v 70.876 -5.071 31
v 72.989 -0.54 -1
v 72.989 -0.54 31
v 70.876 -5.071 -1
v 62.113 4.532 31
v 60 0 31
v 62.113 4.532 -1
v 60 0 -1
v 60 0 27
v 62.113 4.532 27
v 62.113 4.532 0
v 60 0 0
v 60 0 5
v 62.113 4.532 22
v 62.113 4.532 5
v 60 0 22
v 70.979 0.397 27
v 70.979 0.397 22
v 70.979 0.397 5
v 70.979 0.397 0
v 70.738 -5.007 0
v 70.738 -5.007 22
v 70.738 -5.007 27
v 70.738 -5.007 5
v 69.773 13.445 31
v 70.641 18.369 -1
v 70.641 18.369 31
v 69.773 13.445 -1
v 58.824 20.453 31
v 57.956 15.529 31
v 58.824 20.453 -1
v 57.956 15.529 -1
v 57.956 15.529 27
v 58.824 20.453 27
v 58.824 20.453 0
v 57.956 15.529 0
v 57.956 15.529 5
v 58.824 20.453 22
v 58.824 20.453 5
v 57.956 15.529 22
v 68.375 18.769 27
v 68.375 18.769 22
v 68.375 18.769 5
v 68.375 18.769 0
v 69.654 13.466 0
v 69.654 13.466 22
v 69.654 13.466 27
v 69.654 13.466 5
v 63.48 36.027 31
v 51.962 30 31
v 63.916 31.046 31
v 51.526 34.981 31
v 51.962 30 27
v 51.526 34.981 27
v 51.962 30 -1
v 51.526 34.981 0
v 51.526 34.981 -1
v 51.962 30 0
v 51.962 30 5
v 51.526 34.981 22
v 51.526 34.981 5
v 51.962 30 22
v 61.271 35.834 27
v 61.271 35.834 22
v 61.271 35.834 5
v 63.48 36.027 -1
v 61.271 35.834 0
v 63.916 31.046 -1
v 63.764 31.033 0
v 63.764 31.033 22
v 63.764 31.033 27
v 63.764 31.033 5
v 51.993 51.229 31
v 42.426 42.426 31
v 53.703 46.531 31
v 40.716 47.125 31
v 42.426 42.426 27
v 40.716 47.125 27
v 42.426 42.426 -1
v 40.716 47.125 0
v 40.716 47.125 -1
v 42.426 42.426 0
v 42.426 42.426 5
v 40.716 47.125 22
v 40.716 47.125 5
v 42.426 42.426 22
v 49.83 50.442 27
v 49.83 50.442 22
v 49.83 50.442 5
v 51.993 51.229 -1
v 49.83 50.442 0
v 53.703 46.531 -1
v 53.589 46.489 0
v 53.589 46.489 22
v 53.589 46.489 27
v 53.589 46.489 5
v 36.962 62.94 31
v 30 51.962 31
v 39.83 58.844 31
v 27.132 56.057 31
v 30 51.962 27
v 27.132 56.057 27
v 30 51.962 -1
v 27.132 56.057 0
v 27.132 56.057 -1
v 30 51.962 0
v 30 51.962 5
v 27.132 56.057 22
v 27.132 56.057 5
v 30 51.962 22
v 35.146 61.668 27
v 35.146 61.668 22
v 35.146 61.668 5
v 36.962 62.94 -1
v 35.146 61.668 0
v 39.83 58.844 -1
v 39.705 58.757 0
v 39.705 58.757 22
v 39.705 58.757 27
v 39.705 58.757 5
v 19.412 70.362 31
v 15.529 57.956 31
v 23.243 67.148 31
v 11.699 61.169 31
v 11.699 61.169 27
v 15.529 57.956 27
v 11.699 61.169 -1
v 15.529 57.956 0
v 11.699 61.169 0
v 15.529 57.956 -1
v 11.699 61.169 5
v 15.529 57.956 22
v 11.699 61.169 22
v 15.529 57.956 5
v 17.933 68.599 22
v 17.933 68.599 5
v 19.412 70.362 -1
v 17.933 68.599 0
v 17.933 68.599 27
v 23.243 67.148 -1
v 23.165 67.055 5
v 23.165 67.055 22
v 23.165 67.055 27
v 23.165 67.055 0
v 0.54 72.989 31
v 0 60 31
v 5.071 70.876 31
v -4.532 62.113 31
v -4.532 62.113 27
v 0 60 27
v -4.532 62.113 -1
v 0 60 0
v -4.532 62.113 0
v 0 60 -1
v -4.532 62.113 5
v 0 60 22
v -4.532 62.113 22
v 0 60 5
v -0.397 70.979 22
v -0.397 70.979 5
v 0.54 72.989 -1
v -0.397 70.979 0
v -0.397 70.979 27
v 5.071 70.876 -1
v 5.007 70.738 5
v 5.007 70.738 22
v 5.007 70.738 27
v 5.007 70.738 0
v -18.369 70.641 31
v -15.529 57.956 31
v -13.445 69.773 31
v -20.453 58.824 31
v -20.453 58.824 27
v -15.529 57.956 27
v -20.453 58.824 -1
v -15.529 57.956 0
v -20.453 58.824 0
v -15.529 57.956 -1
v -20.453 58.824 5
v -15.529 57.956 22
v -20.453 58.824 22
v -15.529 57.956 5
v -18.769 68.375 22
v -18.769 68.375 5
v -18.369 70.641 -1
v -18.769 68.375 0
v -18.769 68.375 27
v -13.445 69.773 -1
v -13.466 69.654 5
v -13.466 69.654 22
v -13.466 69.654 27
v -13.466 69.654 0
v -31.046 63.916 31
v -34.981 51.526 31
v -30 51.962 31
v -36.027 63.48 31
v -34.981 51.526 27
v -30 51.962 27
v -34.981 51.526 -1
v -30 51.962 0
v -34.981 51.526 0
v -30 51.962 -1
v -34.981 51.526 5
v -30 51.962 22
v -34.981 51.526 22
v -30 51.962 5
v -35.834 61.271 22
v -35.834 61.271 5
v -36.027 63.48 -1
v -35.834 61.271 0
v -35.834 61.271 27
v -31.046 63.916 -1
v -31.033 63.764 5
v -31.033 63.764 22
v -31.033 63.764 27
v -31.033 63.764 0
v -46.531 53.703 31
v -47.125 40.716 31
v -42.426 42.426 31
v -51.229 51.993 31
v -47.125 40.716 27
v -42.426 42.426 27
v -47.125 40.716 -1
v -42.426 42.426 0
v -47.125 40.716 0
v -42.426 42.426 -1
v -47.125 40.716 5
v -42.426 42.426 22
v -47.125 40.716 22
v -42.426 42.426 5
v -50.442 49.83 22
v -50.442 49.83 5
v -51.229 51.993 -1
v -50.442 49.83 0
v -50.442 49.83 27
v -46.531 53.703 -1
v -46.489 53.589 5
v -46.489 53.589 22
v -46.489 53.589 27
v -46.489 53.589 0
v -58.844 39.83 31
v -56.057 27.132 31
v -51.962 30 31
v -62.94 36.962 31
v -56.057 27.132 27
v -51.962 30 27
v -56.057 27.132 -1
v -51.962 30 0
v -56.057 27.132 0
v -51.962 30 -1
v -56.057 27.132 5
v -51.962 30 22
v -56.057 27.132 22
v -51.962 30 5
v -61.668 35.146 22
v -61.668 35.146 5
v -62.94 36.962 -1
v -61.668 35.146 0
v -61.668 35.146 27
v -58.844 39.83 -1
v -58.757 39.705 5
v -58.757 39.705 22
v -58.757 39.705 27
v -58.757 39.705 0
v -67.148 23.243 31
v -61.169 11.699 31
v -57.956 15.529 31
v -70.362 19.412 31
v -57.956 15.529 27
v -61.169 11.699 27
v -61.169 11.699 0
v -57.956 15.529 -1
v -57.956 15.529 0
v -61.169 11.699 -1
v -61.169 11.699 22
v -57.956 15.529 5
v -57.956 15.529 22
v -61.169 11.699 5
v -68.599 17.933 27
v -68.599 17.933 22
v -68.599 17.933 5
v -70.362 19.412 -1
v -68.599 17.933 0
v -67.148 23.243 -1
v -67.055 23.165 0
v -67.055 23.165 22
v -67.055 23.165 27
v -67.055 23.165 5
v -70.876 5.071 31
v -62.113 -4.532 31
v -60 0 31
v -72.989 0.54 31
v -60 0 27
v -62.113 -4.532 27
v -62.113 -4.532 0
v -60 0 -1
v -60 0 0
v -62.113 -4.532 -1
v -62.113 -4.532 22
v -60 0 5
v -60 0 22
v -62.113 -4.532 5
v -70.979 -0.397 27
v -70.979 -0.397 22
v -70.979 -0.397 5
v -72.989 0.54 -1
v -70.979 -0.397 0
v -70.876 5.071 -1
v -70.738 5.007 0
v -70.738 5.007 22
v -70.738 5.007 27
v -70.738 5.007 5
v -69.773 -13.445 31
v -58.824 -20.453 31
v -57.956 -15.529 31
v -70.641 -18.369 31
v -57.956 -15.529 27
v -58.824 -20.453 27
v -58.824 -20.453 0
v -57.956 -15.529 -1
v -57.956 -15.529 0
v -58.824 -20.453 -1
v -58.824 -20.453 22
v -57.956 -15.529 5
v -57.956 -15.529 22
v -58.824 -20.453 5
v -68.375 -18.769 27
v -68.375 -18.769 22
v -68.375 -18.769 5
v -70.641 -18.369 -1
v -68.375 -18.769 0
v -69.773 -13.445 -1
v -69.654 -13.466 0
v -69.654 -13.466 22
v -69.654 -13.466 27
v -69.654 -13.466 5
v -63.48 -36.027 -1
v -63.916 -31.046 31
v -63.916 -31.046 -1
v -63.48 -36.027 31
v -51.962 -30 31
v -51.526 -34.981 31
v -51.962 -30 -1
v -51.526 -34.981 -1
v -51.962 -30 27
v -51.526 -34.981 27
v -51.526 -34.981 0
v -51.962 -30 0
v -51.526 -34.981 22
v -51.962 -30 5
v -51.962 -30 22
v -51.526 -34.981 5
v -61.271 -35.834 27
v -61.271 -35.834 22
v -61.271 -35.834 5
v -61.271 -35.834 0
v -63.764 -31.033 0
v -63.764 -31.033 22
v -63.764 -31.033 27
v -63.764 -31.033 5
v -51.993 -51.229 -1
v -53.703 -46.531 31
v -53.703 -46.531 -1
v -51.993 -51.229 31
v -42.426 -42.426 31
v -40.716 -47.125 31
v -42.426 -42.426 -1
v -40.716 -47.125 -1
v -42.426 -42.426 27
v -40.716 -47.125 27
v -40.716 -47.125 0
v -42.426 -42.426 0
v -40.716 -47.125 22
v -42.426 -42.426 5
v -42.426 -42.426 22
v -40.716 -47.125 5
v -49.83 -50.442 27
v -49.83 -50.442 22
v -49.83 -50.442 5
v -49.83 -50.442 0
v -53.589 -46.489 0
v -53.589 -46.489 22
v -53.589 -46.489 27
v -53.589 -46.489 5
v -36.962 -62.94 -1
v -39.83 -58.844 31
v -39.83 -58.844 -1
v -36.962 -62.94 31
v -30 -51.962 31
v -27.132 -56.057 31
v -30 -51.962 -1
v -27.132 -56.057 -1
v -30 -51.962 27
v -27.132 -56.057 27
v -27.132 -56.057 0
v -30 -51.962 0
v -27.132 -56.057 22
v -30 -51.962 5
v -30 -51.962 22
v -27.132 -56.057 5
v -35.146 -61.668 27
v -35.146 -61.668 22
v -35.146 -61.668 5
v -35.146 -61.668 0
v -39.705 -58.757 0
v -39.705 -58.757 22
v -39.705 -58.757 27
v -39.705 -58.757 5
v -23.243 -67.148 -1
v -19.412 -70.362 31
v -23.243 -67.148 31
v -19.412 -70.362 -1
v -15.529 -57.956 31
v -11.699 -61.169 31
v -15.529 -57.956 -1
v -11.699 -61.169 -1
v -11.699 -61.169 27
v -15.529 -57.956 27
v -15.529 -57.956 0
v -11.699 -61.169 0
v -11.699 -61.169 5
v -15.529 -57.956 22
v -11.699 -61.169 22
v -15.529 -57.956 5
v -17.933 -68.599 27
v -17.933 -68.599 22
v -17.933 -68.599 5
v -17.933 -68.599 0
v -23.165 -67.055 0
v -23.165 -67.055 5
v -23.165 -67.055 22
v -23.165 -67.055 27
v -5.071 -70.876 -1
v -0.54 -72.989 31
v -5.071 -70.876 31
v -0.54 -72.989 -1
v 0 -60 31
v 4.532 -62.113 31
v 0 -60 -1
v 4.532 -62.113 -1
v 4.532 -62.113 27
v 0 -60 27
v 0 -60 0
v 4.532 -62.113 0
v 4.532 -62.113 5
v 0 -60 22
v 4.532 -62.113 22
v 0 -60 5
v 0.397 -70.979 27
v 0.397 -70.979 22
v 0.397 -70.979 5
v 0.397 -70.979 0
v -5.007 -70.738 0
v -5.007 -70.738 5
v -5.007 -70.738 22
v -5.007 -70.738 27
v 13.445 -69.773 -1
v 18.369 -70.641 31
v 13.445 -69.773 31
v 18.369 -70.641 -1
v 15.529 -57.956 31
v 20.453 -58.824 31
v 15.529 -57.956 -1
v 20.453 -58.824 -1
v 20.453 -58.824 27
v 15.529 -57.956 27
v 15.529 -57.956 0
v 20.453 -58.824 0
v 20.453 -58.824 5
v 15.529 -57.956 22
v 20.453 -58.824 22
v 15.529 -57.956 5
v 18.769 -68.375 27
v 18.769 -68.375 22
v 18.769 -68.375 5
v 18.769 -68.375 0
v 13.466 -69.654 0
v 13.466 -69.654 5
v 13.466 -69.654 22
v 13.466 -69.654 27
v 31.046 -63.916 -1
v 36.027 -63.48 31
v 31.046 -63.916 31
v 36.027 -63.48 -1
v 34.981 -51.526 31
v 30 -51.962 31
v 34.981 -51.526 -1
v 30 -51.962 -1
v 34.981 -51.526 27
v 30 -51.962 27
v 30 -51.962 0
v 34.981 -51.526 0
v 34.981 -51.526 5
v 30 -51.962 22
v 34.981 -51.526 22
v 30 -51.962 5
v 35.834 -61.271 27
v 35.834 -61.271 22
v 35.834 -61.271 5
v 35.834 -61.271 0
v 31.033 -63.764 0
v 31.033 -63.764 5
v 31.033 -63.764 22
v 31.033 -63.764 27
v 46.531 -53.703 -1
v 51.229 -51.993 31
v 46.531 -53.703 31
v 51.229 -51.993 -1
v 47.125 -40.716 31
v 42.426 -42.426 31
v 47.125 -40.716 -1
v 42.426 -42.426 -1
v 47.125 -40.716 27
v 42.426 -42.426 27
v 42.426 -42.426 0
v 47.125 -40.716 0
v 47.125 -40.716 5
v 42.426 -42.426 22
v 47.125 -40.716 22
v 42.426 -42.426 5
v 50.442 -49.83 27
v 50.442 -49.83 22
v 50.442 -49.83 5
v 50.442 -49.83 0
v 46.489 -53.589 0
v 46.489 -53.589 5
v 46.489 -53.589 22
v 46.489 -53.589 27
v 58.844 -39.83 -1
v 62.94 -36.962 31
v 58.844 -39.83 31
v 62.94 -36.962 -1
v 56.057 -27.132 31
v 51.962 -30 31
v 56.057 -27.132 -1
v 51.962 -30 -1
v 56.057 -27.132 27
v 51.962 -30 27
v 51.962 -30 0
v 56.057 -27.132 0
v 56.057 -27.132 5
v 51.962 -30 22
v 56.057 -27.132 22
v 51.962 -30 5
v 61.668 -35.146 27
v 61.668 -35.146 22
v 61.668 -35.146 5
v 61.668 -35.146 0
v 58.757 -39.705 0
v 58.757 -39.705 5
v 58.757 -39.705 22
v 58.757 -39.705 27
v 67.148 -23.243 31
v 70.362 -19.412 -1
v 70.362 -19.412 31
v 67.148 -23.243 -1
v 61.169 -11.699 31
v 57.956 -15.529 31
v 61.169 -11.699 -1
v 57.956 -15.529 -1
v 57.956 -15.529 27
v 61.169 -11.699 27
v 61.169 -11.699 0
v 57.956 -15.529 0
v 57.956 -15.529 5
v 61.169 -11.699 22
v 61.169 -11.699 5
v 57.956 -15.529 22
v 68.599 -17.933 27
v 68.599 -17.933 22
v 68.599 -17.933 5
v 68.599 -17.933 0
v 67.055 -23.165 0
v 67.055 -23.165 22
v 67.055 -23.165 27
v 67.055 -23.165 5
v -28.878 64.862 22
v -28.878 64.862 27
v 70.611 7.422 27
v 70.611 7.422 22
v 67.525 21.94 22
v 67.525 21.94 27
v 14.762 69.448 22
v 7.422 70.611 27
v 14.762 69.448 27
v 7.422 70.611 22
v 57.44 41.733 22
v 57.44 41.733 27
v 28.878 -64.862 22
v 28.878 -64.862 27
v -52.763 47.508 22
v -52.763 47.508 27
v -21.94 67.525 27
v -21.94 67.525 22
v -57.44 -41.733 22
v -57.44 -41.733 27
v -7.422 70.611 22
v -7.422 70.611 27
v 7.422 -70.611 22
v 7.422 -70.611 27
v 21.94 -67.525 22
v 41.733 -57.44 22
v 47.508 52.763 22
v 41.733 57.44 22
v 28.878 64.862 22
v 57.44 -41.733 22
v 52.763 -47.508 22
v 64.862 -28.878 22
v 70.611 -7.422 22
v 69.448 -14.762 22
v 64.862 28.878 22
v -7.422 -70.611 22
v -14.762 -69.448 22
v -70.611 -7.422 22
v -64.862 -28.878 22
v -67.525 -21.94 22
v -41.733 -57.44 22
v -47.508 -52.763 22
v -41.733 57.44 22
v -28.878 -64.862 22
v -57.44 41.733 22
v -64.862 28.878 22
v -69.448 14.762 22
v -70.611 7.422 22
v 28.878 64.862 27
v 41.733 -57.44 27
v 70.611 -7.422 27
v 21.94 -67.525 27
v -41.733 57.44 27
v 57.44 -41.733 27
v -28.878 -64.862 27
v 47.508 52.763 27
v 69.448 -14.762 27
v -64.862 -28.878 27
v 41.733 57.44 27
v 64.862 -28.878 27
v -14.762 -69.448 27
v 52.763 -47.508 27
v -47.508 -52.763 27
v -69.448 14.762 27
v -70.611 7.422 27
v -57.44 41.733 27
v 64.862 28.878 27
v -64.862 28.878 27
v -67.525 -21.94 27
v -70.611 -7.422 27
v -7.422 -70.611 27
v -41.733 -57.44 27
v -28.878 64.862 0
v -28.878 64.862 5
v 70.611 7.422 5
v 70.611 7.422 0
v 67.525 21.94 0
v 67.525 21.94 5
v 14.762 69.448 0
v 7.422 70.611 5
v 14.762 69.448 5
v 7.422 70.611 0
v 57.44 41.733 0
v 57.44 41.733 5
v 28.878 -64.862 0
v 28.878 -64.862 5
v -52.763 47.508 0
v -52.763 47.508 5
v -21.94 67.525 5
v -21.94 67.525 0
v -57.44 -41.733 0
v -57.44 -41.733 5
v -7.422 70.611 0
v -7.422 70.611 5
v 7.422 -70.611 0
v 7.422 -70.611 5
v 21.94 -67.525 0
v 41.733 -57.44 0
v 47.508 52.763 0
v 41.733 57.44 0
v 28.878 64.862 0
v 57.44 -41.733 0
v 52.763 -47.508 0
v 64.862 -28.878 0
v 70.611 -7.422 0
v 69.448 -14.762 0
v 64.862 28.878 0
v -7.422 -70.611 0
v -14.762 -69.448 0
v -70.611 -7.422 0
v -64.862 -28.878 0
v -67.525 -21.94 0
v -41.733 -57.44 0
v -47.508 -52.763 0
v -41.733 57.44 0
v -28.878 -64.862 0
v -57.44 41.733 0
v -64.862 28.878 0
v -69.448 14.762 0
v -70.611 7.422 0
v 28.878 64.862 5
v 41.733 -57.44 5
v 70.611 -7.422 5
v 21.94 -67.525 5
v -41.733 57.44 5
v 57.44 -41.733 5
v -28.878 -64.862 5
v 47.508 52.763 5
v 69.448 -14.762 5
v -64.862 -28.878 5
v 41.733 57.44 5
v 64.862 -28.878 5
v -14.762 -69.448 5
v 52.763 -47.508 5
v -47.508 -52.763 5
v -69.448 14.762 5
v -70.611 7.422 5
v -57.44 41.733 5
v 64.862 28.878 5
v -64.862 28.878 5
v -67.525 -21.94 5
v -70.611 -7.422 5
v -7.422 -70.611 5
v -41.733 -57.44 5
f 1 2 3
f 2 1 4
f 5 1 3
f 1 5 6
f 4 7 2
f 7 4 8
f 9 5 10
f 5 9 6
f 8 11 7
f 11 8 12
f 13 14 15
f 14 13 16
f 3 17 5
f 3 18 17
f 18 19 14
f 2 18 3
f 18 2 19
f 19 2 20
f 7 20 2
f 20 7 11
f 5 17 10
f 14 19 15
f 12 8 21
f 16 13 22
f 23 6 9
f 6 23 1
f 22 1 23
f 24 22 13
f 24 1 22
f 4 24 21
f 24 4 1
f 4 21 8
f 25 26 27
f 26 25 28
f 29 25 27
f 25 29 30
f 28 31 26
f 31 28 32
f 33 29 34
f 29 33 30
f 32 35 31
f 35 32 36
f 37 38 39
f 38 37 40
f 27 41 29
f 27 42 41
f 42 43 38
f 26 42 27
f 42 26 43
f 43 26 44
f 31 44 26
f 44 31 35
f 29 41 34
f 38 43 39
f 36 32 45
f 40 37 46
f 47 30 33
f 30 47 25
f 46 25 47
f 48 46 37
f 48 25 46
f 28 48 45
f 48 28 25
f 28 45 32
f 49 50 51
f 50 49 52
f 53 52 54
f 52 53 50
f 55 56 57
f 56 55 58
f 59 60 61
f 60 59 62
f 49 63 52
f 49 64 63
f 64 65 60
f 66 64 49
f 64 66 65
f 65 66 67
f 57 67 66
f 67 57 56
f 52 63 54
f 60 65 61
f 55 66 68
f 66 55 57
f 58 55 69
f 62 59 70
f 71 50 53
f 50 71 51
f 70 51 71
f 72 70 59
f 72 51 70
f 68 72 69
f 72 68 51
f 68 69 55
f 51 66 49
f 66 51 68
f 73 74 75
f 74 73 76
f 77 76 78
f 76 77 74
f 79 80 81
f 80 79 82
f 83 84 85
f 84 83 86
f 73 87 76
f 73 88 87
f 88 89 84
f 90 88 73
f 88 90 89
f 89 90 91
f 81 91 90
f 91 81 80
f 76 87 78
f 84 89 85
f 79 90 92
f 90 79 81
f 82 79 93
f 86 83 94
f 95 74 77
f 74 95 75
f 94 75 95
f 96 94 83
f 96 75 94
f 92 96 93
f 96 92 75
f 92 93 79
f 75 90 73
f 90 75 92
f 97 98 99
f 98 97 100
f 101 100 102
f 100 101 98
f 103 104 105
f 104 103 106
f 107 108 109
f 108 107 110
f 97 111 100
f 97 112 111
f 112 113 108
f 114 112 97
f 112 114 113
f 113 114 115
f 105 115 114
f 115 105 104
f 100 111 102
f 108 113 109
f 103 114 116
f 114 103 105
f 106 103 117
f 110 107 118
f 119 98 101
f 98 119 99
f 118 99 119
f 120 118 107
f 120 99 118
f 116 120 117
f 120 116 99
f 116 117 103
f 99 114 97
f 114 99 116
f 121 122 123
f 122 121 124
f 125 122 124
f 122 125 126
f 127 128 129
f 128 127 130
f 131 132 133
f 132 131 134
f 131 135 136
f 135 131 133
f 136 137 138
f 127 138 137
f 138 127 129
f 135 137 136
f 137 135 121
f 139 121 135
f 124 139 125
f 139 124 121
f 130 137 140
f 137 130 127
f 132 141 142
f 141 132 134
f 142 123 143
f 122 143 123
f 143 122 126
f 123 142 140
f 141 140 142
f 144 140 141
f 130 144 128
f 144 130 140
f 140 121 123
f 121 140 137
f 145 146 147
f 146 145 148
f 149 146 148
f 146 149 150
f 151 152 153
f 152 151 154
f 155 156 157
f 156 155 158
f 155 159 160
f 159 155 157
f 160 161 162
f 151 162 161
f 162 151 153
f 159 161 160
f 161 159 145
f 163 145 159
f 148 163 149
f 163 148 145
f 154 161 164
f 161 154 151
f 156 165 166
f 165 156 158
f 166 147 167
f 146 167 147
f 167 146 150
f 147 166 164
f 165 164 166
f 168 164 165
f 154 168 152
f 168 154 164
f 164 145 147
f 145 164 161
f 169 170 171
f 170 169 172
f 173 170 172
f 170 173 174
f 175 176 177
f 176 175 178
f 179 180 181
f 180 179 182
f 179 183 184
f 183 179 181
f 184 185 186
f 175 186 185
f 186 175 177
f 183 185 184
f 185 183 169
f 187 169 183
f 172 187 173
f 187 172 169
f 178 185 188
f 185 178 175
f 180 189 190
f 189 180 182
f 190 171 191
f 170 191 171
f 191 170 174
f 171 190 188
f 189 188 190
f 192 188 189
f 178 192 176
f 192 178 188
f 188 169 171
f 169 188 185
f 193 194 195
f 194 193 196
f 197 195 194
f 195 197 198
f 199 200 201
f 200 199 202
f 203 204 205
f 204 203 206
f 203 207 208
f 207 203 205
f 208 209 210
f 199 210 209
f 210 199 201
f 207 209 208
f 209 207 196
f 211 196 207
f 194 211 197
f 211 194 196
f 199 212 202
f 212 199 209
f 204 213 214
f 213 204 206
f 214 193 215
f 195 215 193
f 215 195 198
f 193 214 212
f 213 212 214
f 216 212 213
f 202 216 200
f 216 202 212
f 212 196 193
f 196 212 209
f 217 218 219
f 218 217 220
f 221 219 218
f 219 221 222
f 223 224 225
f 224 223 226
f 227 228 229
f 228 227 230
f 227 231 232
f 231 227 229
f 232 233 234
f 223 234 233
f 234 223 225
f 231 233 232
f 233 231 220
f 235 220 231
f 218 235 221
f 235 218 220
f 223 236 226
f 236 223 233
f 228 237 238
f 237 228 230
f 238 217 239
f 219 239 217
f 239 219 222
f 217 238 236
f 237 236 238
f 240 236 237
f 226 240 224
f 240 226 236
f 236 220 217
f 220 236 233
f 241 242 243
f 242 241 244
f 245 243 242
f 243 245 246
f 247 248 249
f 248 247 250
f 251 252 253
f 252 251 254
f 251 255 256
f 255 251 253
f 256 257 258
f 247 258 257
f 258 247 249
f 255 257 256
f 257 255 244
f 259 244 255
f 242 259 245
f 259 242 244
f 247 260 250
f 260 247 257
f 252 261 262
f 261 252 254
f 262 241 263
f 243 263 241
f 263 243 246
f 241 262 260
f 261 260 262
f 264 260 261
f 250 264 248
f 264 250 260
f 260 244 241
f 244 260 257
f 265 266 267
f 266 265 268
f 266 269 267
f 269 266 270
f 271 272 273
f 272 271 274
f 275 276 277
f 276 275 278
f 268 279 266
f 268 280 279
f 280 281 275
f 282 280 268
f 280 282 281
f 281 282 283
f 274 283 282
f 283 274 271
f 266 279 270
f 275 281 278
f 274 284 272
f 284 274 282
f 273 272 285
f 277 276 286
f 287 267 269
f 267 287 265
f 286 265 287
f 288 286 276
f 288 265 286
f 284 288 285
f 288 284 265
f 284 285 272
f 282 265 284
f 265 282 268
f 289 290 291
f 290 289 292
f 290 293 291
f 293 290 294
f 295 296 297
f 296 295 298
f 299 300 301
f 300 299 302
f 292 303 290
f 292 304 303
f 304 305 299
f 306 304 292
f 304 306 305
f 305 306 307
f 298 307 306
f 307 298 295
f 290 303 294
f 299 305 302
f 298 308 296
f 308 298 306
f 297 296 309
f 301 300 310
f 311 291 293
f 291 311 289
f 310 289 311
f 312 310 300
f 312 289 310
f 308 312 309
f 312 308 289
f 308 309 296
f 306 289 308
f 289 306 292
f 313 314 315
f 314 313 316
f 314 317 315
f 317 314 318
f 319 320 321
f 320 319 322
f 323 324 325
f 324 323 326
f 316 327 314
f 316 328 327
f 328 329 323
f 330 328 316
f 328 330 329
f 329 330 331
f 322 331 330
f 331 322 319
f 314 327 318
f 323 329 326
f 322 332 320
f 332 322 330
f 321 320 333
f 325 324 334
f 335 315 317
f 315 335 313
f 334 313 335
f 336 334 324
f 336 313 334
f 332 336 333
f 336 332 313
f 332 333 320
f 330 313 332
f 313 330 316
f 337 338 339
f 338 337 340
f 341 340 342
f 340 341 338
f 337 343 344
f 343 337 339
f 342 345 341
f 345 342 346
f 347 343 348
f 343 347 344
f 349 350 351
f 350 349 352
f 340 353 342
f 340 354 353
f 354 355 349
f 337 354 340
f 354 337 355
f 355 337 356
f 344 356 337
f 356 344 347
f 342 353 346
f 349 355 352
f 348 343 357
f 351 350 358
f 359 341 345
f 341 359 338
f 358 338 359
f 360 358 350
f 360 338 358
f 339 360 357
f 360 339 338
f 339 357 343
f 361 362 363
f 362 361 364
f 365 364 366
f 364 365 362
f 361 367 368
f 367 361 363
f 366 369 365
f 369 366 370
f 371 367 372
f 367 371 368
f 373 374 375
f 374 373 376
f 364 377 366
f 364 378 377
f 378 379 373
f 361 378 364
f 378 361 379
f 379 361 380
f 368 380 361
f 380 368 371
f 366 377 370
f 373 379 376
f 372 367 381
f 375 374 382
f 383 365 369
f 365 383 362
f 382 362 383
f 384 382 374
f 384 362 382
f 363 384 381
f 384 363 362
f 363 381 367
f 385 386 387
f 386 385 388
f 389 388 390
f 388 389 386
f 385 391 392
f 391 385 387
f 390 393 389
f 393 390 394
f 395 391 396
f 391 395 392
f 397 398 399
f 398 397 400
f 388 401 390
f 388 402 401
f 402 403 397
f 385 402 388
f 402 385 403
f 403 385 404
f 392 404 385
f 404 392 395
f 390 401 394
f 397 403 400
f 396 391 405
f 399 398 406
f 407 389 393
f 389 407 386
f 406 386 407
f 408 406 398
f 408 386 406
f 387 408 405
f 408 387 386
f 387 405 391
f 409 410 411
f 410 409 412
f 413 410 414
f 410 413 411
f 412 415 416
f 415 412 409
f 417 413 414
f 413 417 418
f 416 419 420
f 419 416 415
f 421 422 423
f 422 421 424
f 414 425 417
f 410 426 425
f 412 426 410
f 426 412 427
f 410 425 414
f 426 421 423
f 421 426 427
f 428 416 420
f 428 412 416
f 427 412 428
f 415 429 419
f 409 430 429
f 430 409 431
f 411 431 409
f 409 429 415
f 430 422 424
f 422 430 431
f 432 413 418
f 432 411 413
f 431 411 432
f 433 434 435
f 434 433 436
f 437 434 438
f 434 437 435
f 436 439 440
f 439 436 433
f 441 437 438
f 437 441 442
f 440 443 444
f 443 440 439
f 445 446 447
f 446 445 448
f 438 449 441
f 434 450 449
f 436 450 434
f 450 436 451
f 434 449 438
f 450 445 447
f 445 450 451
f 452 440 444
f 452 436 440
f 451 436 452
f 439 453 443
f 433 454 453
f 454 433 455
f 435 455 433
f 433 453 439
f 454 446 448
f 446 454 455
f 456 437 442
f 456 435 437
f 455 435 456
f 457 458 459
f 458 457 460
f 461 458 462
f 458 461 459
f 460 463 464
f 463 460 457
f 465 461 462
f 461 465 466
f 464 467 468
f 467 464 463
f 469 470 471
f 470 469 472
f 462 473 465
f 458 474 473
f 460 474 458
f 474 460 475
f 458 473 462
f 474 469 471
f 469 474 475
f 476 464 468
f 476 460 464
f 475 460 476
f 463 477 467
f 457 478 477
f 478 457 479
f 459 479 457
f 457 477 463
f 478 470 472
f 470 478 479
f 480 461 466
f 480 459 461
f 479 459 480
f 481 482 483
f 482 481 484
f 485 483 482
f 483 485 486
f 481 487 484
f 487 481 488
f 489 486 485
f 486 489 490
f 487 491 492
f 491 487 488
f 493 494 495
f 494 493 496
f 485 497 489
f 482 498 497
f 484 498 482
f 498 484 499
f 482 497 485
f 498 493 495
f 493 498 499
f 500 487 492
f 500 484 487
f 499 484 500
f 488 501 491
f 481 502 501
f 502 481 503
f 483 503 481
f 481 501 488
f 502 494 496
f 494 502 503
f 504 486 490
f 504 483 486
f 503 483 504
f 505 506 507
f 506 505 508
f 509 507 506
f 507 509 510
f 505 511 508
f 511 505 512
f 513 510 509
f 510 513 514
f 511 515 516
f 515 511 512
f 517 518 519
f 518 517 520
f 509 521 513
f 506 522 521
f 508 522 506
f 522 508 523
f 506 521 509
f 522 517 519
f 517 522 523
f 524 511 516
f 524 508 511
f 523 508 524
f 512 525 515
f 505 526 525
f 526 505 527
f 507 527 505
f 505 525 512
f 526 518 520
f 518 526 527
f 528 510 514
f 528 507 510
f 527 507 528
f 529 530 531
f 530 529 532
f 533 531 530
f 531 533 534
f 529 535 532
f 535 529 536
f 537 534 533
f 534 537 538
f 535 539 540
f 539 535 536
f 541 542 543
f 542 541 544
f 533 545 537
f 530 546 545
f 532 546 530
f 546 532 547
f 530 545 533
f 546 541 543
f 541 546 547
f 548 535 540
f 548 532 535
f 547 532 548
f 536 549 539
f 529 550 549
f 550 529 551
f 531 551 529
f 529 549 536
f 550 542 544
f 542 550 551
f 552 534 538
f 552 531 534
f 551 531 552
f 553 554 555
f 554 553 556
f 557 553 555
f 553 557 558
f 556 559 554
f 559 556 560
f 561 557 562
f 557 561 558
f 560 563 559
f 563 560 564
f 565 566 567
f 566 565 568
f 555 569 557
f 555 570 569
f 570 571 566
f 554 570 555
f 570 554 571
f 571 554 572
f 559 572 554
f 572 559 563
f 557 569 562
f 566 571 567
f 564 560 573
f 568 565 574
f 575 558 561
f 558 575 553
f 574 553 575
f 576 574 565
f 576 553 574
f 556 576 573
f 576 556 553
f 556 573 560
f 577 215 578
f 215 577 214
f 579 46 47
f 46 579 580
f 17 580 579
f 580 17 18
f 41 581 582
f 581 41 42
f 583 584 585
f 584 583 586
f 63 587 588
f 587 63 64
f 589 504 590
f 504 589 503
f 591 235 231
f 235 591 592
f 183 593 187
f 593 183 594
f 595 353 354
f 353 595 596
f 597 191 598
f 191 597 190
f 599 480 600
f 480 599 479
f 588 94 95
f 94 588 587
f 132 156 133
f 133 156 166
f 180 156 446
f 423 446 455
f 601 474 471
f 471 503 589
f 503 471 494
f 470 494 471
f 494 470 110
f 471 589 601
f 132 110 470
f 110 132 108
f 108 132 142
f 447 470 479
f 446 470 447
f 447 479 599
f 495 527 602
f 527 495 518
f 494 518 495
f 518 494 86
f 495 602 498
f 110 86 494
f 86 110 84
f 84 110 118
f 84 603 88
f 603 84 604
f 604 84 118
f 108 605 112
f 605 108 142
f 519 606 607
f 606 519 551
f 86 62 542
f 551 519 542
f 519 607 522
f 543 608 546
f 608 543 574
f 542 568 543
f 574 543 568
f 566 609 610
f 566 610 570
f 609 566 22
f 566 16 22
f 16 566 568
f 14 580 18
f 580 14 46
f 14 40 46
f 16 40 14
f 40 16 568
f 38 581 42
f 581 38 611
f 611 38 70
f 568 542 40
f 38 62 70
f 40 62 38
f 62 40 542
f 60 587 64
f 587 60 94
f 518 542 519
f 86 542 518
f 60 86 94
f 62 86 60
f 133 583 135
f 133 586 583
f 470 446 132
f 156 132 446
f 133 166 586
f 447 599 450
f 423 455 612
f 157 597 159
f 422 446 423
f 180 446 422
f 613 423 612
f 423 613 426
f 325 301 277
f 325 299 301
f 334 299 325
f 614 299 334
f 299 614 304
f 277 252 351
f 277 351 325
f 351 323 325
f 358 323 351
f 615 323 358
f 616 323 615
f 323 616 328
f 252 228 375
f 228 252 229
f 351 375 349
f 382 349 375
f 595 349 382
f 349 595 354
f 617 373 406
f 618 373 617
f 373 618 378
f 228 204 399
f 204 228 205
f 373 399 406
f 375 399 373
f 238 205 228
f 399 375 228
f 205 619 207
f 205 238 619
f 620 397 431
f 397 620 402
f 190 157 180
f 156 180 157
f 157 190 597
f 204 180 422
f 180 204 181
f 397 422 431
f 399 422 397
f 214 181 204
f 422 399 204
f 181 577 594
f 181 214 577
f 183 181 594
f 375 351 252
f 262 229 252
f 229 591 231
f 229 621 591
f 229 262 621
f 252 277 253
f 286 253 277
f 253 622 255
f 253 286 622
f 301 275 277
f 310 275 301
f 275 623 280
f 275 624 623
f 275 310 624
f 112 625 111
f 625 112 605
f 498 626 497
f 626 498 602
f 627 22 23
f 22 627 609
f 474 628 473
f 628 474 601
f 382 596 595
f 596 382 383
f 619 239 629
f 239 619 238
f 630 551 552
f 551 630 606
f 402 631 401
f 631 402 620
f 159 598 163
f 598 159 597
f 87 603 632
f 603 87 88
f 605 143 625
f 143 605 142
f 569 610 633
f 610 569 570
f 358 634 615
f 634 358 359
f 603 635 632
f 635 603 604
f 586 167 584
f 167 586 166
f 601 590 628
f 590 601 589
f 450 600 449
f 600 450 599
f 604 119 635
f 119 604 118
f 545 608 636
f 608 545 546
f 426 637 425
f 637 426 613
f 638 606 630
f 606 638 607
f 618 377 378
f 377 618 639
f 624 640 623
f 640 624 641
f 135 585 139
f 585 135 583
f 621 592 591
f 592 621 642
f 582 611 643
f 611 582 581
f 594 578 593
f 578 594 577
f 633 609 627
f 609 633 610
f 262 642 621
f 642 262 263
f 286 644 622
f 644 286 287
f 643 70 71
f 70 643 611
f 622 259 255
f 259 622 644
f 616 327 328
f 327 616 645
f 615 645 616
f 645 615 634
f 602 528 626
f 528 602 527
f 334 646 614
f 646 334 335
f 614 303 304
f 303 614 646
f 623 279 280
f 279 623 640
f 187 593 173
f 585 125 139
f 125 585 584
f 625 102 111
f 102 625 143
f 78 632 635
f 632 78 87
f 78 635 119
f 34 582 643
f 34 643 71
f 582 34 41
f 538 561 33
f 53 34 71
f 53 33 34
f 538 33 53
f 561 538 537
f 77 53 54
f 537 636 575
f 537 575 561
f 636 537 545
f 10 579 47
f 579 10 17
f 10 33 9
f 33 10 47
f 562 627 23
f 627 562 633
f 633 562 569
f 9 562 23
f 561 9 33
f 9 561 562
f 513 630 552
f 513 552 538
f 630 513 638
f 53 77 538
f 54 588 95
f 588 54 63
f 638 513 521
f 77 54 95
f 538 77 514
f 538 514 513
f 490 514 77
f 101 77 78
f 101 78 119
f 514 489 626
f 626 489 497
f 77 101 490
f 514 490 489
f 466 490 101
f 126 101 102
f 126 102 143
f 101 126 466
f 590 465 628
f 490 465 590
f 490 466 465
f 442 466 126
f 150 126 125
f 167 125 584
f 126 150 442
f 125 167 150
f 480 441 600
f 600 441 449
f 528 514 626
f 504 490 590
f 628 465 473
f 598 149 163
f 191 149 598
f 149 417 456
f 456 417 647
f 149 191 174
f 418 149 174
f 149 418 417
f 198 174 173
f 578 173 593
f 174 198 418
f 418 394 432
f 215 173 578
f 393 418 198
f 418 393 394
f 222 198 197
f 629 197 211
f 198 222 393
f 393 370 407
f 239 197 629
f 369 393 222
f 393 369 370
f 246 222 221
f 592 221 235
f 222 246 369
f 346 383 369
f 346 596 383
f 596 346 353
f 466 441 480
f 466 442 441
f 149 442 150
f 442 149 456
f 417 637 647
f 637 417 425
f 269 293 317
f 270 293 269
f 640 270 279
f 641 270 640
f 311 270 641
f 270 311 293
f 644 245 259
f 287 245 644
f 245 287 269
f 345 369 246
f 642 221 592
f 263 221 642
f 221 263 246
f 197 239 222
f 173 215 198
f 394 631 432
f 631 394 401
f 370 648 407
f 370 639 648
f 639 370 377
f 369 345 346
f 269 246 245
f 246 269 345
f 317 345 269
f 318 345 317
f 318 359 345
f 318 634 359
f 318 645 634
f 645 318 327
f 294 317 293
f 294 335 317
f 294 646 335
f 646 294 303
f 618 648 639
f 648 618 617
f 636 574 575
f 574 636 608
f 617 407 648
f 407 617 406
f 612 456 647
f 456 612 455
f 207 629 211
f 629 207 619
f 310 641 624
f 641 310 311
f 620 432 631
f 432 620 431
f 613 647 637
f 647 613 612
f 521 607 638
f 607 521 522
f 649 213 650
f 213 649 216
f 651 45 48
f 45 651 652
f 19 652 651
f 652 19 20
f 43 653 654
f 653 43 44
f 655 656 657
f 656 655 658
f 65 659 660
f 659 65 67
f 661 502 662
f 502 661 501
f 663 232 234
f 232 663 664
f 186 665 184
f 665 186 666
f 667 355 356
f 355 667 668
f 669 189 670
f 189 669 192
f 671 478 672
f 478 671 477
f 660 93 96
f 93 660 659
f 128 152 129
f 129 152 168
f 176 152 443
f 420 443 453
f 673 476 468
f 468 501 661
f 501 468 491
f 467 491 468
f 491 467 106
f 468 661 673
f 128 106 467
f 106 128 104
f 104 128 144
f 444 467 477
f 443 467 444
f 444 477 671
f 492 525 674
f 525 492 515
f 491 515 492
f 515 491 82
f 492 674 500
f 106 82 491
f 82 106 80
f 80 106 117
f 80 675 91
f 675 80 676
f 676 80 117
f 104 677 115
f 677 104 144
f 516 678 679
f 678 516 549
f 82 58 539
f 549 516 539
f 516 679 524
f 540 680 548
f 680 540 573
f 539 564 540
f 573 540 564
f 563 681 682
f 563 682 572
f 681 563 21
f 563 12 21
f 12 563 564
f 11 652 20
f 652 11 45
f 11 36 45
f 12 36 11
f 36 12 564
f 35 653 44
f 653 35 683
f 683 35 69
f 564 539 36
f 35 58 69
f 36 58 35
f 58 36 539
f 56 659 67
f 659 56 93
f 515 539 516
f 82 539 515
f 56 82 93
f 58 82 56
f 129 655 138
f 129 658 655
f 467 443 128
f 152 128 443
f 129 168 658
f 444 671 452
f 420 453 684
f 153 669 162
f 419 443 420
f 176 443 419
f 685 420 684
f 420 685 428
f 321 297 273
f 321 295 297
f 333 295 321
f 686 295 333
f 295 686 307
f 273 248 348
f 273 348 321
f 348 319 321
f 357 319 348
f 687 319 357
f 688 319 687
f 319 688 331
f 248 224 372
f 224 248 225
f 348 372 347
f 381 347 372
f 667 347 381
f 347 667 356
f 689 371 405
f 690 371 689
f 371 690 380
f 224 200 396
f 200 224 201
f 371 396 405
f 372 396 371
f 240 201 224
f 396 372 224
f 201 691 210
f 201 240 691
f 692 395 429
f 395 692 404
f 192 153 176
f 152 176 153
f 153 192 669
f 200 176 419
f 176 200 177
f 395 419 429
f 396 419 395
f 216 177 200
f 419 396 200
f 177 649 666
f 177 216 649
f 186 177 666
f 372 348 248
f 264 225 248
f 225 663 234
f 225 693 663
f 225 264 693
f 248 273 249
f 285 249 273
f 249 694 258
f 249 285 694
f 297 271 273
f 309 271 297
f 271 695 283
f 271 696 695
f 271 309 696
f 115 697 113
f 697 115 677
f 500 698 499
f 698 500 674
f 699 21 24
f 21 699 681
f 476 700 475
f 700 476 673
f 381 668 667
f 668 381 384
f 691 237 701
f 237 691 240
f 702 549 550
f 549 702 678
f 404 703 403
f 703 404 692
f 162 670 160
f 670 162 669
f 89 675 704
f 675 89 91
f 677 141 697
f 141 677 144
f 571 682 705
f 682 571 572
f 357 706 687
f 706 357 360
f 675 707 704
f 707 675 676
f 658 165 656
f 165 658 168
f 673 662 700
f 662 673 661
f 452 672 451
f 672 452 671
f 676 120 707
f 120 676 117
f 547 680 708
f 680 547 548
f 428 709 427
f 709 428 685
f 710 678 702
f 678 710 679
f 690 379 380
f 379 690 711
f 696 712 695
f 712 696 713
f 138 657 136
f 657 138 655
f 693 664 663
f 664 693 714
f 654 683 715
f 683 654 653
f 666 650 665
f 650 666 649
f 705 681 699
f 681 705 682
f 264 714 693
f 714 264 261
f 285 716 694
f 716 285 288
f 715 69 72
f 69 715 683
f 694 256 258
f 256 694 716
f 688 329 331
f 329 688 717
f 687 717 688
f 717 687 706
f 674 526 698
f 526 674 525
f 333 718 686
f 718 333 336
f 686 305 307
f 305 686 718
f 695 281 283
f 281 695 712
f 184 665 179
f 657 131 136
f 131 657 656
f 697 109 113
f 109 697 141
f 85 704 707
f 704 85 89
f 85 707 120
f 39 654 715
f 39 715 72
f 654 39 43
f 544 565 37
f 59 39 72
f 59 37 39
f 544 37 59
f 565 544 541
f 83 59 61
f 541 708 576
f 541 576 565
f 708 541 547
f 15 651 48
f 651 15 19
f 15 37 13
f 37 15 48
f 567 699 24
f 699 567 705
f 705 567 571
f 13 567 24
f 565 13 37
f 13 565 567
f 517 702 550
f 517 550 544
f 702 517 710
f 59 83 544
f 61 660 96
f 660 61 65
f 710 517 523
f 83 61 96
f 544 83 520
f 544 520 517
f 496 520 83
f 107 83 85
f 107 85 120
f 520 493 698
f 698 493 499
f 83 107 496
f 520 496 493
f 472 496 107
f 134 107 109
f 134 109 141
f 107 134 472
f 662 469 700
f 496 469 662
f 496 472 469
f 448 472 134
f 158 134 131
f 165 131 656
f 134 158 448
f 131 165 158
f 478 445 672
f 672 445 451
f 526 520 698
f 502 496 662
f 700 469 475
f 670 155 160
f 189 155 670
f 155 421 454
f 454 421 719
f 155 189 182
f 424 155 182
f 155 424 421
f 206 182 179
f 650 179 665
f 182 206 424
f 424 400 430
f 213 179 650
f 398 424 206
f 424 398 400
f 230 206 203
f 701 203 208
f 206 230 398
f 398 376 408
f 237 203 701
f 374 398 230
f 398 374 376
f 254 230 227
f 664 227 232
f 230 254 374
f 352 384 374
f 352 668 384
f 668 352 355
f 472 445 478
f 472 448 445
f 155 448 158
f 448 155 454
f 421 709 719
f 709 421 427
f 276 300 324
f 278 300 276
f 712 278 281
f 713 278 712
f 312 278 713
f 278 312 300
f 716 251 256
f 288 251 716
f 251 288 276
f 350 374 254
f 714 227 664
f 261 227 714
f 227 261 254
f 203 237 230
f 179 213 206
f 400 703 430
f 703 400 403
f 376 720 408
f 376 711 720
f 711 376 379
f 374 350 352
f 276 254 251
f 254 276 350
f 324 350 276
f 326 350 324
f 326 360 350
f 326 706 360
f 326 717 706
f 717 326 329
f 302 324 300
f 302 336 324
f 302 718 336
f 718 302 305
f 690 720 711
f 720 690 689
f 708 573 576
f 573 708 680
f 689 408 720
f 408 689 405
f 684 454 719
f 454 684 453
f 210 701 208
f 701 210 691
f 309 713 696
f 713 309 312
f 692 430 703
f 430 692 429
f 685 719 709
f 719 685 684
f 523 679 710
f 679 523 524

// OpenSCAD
/*
*******************************************
Objekt Info: Mehrfach Rotation

*******************************************
Version: 16.10.2025 khf
*******************************************
*/

//***************   Auswahl   *************

        //Auswahl 1=alles, 1= Quader, 2=Zylinder, 3=Kugel 
        auswahl="0";

//***************   Libraries  ************

//keine

//*****************************************

//***************  Parameter   *************
$fn=60;
//*****************************************

//**************   Programm  **************
translate([0, 0, 22])
difference() {
color("red")
cylinder(h = 5, r = 71);

translate([0, 0, -1])
for (i = [0 : 23]) {
    rotate([0, 0, i * 15])  // 360° / 24 = 15°
    translate([60, 0, 0])   // Abstand vom Zentrum
    //cylinder(h = 10, r = 2); // Dein Objekt (z.B. ein Zylinder)
     rotate([0, 0, -25])
     cube([12,5,32],false);   
}
}


color("red")
cylinder(h = 5, r = 71);

translate([0, 0, -1])
for (i = [0 : 23]) {
    rotate([0, 0, i * 15])  // 360° / 24 = 15°
    translate([60, 0, 0])   // Abstand vom Zentrum
    //cylinder(h = 10, r = 2); // Dein Objekt (z.B. ein Zylinder)
     rotate([0, 0, -25])
     cube([12,5,32],false);   
}
